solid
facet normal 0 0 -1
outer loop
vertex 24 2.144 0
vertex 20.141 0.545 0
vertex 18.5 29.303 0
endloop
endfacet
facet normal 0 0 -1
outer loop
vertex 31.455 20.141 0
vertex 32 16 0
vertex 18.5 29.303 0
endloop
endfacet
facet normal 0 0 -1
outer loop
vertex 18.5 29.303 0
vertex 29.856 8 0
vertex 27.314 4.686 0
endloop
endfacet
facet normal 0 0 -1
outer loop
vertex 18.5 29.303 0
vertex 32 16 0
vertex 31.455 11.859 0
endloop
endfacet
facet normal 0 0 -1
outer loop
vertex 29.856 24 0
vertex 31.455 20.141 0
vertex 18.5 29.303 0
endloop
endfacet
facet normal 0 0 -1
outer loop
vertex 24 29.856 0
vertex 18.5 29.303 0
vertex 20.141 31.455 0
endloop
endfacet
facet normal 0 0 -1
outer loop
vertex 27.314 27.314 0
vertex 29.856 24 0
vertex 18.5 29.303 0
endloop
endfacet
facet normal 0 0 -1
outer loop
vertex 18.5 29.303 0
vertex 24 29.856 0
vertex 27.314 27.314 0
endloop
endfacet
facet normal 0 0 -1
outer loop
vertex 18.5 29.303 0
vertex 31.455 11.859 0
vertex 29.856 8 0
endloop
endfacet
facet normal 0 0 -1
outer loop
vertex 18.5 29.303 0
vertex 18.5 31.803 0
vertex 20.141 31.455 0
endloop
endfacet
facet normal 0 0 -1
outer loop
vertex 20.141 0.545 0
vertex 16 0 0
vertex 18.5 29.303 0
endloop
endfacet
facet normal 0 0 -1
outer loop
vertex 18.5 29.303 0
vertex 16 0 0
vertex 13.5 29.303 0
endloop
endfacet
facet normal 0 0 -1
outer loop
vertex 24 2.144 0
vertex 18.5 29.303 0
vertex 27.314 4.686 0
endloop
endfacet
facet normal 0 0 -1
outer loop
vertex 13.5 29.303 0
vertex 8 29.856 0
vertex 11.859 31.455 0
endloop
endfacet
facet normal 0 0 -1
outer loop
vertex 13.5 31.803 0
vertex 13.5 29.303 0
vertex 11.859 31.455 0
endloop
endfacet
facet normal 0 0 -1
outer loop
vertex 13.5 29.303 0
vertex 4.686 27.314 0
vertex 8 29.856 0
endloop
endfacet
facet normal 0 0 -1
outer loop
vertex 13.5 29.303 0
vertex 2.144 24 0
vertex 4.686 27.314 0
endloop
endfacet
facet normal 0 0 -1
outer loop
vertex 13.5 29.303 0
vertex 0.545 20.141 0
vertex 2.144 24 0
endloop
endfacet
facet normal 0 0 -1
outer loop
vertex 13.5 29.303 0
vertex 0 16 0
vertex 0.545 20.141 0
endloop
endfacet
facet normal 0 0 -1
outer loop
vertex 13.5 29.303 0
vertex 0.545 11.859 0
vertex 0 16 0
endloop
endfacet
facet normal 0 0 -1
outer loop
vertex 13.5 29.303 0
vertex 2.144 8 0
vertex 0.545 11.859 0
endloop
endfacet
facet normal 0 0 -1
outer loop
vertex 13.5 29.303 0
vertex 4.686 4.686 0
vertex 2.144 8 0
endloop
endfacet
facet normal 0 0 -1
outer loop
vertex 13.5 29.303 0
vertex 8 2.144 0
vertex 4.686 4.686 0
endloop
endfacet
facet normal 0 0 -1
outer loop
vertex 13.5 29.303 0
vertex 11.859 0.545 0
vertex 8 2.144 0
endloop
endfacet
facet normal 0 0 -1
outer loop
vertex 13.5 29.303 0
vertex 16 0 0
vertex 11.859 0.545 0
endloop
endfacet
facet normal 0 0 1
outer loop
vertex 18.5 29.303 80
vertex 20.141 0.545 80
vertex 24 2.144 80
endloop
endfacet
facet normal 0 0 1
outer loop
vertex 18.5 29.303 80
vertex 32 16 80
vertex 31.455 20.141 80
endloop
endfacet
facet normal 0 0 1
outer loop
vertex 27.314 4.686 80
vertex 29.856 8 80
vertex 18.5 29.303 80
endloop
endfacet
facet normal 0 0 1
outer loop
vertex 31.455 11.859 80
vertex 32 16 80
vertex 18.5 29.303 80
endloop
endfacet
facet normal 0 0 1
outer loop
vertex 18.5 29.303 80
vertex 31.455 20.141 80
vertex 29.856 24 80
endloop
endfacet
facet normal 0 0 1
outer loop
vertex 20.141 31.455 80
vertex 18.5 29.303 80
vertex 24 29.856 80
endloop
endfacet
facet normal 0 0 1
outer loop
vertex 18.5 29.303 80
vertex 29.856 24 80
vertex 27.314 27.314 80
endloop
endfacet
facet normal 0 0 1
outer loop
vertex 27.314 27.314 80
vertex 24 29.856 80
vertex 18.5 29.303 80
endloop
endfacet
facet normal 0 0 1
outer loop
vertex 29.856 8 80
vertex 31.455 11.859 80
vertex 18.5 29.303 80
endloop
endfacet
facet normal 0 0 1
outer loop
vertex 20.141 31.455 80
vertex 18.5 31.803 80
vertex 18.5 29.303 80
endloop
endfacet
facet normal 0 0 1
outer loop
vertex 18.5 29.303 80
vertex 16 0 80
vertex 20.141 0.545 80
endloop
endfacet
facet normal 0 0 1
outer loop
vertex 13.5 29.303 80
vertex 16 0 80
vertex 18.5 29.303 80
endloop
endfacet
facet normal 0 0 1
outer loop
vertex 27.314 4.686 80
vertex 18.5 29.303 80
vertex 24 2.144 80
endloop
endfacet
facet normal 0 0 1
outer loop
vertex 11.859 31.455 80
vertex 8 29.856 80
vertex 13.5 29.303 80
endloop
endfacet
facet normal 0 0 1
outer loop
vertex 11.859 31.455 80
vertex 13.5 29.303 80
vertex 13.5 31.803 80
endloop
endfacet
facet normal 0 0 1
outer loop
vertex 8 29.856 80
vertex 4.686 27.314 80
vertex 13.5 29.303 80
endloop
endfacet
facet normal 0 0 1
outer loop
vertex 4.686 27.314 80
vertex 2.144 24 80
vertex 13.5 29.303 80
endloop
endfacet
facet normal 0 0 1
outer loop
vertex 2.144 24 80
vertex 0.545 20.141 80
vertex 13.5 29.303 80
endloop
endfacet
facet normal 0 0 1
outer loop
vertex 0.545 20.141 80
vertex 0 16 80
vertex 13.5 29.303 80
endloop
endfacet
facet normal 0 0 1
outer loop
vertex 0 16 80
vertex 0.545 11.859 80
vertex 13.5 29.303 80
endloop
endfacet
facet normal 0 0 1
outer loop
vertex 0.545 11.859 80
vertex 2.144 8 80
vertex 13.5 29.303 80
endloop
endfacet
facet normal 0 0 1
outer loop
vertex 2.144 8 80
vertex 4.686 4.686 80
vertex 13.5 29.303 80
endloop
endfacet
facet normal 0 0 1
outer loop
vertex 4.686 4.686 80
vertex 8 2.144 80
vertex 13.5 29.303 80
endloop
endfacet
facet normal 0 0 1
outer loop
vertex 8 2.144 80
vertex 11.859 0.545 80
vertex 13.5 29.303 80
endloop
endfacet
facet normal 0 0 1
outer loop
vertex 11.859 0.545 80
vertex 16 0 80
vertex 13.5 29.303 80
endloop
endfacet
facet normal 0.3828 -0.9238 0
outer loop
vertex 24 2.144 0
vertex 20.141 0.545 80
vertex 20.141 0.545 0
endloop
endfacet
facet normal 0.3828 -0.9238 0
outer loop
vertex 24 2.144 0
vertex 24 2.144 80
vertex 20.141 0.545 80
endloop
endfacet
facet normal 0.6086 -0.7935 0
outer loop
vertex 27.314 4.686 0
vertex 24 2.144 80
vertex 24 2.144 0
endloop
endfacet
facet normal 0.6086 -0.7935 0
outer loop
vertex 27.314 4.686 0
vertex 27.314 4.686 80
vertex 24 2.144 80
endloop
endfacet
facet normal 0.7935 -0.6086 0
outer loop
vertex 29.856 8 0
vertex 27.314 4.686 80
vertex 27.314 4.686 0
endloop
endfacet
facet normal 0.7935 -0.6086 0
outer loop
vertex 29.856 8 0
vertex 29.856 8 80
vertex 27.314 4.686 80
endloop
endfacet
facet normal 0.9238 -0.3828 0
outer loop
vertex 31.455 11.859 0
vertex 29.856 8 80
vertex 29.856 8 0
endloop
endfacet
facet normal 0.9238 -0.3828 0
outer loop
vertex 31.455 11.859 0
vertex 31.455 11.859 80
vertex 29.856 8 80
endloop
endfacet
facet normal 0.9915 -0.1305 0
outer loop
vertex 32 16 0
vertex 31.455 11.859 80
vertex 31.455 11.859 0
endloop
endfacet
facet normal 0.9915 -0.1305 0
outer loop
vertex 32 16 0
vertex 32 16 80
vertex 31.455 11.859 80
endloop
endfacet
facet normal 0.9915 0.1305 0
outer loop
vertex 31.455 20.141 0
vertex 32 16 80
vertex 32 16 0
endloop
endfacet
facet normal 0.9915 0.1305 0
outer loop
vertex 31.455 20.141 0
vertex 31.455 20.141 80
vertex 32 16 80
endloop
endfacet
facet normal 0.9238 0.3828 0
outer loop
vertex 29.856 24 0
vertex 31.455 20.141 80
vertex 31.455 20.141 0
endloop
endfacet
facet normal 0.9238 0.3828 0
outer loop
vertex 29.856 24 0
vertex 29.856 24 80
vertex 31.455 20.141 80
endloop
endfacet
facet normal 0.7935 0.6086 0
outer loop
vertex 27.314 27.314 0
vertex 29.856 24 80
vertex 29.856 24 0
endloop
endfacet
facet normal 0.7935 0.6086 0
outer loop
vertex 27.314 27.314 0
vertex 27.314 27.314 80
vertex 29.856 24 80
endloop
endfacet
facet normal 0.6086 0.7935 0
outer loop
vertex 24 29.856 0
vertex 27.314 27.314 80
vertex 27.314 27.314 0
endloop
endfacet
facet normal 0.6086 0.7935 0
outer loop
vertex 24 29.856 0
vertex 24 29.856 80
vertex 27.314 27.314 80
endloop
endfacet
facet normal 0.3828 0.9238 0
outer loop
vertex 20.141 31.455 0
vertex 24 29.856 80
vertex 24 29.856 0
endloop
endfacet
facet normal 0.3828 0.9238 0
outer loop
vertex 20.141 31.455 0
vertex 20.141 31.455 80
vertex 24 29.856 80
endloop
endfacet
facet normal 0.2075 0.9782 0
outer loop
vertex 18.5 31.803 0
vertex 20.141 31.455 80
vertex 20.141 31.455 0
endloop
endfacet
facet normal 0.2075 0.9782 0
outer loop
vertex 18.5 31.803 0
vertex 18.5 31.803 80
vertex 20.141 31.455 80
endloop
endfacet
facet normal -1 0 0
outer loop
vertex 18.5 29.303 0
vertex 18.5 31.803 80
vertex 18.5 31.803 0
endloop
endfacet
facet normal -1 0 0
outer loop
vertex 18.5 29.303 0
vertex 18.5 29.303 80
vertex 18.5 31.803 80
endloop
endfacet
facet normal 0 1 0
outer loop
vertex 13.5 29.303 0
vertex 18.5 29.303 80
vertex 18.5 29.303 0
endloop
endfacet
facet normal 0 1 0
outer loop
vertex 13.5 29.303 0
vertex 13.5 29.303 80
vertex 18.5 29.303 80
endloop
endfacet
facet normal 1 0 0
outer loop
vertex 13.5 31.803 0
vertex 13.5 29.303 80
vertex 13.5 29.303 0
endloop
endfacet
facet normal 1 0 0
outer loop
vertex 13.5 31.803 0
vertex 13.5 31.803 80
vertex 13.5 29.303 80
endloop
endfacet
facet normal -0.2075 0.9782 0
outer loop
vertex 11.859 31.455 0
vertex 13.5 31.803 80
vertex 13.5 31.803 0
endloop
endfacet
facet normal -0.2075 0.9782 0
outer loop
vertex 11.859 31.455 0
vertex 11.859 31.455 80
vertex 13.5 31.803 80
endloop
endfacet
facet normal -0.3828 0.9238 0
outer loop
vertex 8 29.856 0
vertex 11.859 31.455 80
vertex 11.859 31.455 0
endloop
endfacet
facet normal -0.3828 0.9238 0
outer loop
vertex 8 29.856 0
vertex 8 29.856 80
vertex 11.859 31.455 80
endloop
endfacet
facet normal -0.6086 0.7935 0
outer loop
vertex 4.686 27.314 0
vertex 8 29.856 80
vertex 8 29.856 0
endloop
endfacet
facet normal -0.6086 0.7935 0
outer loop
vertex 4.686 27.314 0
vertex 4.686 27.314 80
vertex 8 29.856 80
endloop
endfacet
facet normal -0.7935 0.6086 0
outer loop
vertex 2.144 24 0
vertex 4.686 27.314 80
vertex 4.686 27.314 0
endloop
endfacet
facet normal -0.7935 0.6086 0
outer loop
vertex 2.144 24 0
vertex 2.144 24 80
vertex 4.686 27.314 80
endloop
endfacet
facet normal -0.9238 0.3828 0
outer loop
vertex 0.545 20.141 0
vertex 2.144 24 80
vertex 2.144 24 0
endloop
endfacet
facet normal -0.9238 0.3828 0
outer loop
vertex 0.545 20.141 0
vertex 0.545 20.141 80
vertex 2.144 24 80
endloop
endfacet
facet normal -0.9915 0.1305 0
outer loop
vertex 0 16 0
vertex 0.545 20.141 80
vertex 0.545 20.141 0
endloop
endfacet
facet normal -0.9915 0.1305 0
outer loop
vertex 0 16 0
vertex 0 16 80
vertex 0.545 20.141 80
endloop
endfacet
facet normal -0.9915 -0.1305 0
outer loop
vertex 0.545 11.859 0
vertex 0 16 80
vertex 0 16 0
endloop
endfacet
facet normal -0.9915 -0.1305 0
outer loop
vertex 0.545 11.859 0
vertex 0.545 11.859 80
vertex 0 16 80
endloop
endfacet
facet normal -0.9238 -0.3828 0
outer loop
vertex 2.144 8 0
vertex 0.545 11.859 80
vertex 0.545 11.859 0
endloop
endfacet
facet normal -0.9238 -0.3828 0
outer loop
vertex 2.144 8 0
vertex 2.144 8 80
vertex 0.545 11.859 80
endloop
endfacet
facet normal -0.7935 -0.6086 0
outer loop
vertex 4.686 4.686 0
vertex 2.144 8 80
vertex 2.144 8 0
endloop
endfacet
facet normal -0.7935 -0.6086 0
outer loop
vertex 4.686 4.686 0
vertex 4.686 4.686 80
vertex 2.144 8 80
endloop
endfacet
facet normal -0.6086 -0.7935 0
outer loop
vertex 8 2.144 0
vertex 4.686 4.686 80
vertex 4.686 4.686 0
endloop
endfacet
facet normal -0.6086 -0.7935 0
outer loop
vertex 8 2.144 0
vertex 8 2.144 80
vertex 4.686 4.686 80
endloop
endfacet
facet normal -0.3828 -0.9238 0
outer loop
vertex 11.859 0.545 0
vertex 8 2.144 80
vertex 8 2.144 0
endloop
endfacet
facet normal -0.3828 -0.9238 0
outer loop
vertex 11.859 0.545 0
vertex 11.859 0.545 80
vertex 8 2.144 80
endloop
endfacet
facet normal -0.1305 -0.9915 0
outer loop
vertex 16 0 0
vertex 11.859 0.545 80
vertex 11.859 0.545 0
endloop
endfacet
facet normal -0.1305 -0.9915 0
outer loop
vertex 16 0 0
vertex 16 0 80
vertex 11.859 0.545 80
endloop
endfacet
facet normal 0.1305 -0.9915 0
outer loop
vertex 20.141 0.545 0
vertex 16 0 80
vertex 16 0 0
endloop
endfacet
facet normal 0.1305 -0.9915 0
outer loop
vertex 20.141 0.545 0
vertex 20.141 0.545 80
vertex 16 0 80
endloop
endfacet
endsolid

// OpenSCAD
$fn = 32;

// ----------------------------------------------------------------------
// Keyway shaft: d32 shaft, key 5 x 2.5 mm
// ----------------------------------------------------------------------

// --- parameters (mm) ---
shaft_r = 16;             // shaft radius
key_w = 5;                // keyway width
key_d = 2.5;              // keyway depth below the surface line
plate_t = 80;             // shaft length, Z (extrusion height)

shaft_d = 2 * shaft_r;  // shaft diameter
circle_step = 15;  // polygon sampling step, degrees

profile = [[11.859, 31.455], [8, 29.856], [4.686, 27.314], [2.144, 24], [0.545, 20.141], [0, 16], [0.545, 11.859], [2.144, 8], [4.686, 4.686], [8, 2.144], [11.859, 0.545], [16, 0], [20.141, 0.545], [24, 2.144], [27.314, 4.686], [29.856, 8], [31.455, 11.859], [32, 16], [31.455, 20.141], [29.856, 24], [27.314, 27.314], [24, 29.856], [20.141, 31.455], [18.5, 31.803], [18.5, 29.303], [13.5, 29.303], [13.5, 31.803]];  // primary outline, 27 points, counter clockwise

// --- the one profile operation ---
linear_extrude(height = plate_t) polygon(points = profile);
